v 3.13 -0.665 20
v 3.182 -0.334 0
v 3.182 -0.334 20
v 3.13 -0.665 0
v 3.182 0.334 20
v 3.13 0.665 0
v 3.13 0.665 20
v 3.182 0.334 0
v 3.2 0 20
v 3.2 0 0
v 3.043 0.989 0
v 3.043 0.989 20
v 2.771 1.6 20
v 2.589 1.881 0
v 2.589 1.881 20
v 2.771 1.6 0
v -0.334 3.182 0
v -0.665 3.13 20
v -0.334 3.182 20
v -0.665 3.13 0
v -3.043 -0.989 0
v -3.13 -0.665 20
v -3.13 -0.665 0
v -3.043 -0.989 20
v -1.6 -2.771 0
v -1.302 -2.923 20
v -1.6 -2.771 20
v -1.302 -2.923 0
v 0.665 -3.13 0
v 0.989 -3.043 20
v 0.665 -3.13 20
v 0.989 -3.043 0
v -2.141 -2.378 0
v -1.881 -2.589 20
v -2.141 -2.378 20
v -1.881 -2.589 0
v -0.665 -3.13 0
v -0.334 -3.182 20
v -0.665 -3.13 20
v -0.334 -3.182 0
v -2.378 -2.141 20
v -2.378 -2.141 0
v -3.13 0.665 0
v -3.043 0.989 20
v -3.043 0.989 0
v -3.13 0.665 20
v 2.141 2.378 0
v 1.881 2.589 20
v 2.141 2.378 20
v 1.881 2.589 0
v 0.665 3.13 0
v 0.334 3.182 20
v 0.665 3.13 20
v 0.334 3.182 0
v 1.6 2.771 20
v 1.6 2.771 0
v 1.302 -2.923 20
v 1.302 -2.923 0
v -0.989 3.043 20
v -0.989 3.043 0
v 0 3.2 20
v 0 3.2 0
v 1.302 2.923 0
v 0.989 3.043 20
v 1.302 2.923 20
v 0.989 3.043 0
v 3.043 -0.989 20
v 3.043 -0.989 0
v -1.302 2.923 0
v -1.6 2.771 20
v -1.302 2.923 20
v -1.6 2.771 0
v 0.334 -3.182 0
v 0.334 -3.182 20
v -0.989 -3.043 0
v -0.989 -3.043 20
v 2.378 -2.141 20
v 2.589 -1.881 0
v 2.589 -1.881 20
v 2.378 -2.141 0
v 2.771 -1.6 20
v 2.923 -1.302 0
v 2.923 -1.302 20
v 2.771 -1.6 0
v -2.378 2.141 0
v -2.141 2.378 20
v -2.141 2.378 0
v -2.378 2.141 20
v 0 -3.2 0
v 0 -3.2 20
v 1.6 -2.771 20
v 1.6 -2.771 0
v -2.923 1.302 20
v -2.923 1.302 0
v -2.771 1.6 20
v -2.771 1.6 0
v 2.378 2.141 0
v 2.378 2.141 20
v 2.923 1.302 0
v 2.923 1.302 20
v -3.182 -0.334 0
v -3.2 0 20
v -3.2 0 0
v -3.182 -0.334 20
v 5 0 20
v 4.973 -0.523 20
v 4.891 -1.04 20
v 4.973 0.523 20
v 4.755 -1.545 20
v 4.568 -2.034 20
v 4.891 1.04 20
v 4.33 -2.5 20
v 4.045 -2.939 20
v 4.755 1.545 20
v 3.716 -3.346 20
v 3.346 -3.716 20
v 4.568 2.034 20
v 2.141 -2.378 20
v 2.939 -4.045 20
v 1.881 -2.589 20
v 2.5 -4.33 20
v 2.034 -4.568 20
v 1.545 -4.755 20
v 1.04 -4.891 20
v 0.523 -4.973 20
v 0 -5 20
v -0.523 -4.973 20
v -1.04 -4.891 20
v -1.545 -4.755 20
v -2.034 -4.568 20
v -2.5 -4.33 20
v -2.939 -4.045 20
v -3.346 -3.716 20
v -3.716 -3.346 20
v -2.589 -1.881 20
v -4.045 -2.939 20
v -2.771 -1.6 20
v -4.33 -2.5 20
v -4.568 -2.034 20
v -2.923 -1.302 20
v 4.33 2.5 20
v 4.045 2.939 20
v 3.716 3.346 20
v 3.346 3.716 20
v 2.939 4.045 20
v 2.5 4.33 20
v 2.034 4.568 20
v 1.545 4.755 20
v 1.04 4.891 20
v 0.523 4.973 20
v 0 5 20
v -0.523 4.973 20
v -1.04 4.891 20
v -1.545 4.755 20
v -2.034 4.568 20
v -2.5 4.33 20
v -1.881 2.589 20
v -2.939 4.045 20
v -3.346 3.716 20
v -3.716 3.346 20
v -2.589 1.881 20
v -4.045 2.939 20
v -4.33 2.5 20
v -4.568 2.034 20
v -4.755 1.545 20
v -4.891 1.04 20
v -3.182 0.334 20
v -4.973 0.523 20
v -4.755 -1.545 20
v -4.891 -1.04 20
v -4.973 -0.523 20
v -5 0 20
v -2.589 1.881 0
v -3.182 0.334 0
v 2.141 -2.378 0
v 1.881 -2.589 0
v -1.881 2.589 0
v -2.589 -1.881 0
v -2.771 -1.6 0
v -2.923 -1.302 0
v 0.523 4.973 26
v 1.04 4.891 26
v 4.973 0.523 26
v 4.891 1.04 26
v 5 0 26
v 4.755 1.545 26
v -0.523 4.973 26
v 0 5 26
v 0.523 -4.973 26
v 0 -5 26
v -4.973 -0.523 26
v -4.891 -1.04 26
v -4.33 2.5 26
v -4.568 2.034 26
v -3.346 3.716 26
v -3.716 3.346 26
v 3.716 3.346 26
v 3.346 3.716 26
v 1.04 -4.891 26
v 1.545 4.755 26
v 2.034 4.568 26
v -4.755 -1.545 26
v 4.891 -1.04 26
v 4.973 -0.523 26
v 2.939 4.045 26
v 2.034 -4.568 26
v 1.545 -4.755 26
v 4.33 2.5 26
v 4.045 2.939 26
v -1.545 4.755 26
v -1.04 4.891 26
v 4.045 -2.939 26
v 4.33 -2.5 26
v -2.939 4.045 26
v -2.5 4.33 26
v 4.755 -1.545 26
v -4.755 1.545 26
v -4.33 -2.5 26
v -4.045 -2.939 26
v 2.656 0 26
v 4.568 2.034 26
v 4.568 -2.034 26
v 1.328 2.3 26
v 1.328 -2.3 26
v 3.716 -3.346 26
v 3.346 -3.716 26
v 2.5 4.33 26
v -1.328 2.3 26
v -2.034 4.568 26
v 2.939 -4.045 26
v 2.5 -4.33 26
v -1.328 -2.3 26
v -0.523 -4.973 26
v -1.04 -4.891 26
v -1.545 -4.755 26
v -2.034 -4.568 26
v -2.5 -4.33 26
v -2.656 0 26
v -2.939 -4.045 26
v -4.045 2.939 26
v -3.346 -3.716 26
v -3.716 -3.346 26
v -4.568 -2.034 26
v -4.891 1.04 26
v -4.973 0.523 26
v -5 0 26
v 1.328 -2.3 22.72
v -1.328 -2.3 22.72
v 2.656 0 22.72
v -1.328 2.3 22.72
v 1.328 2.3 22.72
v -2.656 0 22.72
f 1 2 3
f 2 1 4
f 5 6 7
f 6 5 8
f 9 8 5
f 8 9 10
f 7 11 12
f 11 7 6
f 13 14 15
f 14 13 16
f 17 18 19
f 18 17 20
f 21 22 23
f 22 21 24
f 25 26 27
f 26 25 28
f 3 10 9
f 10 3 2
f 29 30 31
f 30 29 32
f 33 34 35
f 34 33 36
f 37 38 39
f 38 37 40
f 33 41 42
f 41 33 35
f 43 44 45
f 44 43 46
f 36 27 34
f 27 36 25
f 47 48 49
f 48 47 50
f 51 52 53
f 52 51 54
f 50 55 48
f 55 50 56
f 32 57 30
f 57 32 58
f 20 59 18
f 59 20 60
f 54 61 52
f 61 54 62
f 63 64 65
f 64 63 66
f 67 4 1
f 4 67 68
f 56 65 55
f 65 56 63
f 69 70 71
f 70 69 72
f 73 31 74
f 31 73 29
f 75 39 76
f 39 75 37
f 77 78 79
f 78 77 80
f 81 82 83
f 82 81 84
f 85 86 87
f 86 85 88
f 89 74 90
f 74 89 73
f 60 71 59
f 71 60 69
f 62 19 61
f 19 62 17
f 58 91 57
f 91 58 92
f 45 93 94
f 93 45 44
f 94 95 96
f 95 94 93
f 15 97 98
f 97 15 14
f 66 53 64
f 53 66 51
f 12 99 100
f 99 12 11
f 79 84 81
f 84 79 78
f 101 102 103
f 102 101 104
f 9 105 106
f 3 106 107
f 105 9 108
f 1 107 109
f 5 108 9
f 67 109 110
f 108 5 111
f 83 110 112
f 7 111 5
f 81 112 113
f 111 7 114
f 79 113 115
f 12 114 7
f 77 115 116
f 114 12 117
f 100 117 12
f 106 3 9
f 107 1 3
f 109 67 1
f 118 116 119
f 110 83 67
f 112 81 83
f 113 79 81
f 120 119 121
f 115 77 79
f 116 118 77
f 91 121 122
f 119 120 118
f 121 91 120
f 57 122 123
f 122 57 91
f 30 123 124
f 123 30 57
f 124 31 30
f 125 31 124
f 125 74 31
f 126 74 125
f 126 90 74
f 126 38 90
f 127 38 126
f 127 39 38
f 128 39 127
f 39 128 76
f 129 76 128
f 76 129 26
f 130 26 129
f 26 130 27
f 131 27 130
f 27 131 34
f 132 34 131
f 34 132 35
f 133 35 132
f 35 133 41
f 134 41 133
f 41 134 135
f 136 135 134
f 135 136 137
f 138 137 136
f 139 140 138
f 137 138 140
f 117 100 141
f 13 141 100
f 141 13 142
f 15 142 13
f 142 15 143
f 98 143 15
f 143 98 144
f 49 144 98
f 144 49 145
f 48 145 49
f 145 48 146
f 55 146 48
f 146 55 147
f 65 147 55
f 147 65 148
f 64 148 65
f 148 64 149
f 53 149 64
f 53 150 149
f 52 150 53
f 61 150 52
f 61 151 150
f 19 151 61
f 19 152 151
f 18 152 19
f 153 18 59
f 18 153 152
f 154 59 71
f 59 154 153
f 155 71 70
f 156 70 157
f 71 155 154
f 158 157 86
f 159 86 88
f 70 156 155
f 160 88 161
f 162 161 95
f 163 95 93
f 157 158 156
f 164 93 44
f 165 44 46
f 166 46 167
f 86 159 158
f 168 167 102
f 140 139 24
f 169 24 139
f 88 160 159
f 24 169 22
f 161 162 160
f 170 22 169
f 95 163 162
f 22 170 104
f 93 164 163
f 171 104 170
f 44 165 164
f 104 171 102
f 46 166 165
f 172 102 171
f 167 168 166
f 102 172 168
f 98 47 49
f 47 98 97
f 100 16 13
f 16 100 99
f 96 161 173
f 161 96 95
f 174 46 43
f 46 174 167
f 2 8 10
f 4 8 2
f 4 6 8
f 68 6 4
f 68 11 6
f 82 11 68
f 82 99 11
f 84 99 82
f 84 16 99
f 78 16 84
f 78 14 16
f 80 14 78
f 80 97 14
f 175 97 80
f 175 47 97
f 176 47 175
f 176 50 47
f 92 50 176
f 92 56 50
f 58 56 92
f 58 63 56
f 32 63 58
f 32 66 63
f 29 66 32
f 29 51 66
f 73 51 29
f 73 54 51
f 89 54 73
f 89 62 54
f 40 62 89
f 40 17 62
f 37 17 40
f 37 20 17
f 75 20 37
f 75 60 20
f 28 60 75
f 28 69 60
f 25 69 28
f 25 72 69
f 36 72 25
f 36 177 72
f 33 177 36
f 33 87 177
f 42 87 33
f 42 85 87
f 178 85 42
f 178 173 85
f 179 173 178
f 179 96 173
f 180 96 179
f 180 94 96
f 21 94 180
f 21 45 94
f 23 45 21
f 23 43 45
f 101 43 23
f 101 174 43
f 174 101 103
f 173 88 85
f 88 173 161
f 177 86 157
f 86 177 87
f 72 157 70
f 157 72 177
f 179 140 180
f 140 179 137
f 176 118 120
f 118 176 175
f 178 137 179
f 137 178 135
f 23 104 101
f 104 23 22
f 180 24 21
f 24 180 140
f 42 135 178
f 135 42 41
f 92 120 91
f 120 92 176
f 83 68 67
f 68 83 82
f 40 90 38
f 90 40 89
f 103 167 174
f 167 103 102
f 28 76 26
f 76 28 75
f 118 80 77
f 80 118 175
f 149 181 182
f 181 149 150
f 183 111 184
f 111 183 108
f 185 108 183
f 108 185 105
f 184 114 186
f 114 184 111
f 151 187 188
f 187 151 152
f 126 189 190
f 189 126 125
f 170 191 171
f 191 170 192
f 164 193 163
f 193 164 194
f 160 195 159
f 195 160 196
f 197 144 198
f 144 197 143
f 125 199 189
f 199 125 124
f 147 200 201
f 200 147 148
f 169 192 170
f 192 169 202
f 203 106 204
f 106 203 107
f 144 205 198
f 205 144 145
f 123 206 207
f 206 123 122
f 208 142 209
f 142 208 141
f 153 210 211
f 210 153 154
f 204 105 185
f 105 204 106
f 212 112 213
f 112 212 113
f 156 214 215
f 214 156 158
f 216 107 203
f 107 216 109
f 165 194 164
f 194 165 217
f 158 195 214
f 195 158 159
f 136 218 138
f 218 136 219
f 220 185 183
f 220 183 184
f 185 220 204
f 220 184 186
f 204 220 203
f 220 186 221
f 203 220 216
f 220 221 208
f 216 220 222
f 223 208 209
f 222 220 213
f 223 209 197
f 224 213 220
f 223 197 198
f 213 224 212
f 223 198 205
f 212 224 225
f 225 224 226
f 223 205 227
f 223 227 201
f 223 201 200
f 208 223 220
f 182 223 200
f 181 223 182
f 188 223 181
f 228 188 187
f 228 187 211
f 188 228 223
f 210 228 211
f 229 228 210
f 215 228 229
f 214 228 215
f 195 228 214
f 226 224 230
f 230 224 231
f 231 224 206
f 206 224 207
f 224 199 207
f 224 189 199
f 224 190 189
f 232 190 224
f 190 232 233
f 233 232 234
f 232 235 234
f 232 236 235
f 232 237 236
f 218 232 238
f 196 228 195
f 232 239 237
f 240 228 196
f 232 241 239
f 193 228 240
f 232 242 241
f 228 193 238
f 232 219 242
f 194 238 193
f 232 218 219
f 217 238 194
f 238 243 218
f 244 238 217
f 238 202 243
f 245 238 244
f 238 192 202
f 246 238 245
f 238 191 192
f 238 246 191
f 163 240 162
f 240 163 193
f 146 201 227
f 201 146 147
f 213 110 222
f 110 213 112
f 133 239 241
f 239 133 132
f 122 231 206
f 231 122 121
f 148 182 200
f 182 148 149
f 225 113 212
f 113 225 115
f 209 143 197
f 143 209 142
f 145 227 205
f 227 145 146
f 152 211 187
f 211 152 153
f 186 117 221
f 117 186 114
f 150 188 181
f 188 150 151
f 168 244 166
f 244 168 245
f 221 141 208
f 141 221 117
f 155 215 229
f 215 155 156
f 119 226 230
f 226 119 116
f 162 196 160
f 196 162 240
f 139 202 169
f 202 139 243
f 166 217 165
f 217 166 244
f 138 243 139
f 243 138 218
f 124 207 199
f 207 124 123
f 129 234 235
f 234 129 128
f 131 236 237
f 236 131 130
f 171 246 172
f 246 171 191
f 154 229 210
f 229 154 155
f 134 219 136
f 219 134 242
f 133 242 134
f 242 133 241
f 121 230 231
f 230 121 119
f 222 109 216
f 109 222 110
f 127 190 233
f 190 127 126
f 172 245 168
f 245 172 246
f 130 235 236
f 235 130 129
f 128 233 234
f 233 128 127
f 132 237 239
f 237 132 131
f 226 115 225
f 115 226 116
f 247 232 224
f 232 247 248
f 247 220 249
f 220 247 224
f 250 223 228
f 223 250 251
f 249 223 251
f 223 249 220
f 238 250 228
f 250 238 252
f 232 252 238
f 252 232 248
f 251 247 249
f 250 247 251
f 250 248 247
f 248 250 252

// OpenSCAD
// Socket-head cap screw, smooth printable representation.
$fn = 60;
eps = 0.02;
shaft_d = 6.4;
head_d = 10;
head_h = 6;
shaft_l = 20;
socket_flat = head_d * 0.46;
socket_depth = head_h * 0.55;
difference() {
    union() {
        cylinder(d = shaft_d, h = shaft_l);
        translate([0, 0, shaft_l]) cylinder(d = head_d, h = head_h);
    }
    translate([0, 0, shaft_l + head_h - socket_depth + eps])
        cylinder(d = socket_flat / cos(30), h = socket_depth + eps, $fn = 6);
}
